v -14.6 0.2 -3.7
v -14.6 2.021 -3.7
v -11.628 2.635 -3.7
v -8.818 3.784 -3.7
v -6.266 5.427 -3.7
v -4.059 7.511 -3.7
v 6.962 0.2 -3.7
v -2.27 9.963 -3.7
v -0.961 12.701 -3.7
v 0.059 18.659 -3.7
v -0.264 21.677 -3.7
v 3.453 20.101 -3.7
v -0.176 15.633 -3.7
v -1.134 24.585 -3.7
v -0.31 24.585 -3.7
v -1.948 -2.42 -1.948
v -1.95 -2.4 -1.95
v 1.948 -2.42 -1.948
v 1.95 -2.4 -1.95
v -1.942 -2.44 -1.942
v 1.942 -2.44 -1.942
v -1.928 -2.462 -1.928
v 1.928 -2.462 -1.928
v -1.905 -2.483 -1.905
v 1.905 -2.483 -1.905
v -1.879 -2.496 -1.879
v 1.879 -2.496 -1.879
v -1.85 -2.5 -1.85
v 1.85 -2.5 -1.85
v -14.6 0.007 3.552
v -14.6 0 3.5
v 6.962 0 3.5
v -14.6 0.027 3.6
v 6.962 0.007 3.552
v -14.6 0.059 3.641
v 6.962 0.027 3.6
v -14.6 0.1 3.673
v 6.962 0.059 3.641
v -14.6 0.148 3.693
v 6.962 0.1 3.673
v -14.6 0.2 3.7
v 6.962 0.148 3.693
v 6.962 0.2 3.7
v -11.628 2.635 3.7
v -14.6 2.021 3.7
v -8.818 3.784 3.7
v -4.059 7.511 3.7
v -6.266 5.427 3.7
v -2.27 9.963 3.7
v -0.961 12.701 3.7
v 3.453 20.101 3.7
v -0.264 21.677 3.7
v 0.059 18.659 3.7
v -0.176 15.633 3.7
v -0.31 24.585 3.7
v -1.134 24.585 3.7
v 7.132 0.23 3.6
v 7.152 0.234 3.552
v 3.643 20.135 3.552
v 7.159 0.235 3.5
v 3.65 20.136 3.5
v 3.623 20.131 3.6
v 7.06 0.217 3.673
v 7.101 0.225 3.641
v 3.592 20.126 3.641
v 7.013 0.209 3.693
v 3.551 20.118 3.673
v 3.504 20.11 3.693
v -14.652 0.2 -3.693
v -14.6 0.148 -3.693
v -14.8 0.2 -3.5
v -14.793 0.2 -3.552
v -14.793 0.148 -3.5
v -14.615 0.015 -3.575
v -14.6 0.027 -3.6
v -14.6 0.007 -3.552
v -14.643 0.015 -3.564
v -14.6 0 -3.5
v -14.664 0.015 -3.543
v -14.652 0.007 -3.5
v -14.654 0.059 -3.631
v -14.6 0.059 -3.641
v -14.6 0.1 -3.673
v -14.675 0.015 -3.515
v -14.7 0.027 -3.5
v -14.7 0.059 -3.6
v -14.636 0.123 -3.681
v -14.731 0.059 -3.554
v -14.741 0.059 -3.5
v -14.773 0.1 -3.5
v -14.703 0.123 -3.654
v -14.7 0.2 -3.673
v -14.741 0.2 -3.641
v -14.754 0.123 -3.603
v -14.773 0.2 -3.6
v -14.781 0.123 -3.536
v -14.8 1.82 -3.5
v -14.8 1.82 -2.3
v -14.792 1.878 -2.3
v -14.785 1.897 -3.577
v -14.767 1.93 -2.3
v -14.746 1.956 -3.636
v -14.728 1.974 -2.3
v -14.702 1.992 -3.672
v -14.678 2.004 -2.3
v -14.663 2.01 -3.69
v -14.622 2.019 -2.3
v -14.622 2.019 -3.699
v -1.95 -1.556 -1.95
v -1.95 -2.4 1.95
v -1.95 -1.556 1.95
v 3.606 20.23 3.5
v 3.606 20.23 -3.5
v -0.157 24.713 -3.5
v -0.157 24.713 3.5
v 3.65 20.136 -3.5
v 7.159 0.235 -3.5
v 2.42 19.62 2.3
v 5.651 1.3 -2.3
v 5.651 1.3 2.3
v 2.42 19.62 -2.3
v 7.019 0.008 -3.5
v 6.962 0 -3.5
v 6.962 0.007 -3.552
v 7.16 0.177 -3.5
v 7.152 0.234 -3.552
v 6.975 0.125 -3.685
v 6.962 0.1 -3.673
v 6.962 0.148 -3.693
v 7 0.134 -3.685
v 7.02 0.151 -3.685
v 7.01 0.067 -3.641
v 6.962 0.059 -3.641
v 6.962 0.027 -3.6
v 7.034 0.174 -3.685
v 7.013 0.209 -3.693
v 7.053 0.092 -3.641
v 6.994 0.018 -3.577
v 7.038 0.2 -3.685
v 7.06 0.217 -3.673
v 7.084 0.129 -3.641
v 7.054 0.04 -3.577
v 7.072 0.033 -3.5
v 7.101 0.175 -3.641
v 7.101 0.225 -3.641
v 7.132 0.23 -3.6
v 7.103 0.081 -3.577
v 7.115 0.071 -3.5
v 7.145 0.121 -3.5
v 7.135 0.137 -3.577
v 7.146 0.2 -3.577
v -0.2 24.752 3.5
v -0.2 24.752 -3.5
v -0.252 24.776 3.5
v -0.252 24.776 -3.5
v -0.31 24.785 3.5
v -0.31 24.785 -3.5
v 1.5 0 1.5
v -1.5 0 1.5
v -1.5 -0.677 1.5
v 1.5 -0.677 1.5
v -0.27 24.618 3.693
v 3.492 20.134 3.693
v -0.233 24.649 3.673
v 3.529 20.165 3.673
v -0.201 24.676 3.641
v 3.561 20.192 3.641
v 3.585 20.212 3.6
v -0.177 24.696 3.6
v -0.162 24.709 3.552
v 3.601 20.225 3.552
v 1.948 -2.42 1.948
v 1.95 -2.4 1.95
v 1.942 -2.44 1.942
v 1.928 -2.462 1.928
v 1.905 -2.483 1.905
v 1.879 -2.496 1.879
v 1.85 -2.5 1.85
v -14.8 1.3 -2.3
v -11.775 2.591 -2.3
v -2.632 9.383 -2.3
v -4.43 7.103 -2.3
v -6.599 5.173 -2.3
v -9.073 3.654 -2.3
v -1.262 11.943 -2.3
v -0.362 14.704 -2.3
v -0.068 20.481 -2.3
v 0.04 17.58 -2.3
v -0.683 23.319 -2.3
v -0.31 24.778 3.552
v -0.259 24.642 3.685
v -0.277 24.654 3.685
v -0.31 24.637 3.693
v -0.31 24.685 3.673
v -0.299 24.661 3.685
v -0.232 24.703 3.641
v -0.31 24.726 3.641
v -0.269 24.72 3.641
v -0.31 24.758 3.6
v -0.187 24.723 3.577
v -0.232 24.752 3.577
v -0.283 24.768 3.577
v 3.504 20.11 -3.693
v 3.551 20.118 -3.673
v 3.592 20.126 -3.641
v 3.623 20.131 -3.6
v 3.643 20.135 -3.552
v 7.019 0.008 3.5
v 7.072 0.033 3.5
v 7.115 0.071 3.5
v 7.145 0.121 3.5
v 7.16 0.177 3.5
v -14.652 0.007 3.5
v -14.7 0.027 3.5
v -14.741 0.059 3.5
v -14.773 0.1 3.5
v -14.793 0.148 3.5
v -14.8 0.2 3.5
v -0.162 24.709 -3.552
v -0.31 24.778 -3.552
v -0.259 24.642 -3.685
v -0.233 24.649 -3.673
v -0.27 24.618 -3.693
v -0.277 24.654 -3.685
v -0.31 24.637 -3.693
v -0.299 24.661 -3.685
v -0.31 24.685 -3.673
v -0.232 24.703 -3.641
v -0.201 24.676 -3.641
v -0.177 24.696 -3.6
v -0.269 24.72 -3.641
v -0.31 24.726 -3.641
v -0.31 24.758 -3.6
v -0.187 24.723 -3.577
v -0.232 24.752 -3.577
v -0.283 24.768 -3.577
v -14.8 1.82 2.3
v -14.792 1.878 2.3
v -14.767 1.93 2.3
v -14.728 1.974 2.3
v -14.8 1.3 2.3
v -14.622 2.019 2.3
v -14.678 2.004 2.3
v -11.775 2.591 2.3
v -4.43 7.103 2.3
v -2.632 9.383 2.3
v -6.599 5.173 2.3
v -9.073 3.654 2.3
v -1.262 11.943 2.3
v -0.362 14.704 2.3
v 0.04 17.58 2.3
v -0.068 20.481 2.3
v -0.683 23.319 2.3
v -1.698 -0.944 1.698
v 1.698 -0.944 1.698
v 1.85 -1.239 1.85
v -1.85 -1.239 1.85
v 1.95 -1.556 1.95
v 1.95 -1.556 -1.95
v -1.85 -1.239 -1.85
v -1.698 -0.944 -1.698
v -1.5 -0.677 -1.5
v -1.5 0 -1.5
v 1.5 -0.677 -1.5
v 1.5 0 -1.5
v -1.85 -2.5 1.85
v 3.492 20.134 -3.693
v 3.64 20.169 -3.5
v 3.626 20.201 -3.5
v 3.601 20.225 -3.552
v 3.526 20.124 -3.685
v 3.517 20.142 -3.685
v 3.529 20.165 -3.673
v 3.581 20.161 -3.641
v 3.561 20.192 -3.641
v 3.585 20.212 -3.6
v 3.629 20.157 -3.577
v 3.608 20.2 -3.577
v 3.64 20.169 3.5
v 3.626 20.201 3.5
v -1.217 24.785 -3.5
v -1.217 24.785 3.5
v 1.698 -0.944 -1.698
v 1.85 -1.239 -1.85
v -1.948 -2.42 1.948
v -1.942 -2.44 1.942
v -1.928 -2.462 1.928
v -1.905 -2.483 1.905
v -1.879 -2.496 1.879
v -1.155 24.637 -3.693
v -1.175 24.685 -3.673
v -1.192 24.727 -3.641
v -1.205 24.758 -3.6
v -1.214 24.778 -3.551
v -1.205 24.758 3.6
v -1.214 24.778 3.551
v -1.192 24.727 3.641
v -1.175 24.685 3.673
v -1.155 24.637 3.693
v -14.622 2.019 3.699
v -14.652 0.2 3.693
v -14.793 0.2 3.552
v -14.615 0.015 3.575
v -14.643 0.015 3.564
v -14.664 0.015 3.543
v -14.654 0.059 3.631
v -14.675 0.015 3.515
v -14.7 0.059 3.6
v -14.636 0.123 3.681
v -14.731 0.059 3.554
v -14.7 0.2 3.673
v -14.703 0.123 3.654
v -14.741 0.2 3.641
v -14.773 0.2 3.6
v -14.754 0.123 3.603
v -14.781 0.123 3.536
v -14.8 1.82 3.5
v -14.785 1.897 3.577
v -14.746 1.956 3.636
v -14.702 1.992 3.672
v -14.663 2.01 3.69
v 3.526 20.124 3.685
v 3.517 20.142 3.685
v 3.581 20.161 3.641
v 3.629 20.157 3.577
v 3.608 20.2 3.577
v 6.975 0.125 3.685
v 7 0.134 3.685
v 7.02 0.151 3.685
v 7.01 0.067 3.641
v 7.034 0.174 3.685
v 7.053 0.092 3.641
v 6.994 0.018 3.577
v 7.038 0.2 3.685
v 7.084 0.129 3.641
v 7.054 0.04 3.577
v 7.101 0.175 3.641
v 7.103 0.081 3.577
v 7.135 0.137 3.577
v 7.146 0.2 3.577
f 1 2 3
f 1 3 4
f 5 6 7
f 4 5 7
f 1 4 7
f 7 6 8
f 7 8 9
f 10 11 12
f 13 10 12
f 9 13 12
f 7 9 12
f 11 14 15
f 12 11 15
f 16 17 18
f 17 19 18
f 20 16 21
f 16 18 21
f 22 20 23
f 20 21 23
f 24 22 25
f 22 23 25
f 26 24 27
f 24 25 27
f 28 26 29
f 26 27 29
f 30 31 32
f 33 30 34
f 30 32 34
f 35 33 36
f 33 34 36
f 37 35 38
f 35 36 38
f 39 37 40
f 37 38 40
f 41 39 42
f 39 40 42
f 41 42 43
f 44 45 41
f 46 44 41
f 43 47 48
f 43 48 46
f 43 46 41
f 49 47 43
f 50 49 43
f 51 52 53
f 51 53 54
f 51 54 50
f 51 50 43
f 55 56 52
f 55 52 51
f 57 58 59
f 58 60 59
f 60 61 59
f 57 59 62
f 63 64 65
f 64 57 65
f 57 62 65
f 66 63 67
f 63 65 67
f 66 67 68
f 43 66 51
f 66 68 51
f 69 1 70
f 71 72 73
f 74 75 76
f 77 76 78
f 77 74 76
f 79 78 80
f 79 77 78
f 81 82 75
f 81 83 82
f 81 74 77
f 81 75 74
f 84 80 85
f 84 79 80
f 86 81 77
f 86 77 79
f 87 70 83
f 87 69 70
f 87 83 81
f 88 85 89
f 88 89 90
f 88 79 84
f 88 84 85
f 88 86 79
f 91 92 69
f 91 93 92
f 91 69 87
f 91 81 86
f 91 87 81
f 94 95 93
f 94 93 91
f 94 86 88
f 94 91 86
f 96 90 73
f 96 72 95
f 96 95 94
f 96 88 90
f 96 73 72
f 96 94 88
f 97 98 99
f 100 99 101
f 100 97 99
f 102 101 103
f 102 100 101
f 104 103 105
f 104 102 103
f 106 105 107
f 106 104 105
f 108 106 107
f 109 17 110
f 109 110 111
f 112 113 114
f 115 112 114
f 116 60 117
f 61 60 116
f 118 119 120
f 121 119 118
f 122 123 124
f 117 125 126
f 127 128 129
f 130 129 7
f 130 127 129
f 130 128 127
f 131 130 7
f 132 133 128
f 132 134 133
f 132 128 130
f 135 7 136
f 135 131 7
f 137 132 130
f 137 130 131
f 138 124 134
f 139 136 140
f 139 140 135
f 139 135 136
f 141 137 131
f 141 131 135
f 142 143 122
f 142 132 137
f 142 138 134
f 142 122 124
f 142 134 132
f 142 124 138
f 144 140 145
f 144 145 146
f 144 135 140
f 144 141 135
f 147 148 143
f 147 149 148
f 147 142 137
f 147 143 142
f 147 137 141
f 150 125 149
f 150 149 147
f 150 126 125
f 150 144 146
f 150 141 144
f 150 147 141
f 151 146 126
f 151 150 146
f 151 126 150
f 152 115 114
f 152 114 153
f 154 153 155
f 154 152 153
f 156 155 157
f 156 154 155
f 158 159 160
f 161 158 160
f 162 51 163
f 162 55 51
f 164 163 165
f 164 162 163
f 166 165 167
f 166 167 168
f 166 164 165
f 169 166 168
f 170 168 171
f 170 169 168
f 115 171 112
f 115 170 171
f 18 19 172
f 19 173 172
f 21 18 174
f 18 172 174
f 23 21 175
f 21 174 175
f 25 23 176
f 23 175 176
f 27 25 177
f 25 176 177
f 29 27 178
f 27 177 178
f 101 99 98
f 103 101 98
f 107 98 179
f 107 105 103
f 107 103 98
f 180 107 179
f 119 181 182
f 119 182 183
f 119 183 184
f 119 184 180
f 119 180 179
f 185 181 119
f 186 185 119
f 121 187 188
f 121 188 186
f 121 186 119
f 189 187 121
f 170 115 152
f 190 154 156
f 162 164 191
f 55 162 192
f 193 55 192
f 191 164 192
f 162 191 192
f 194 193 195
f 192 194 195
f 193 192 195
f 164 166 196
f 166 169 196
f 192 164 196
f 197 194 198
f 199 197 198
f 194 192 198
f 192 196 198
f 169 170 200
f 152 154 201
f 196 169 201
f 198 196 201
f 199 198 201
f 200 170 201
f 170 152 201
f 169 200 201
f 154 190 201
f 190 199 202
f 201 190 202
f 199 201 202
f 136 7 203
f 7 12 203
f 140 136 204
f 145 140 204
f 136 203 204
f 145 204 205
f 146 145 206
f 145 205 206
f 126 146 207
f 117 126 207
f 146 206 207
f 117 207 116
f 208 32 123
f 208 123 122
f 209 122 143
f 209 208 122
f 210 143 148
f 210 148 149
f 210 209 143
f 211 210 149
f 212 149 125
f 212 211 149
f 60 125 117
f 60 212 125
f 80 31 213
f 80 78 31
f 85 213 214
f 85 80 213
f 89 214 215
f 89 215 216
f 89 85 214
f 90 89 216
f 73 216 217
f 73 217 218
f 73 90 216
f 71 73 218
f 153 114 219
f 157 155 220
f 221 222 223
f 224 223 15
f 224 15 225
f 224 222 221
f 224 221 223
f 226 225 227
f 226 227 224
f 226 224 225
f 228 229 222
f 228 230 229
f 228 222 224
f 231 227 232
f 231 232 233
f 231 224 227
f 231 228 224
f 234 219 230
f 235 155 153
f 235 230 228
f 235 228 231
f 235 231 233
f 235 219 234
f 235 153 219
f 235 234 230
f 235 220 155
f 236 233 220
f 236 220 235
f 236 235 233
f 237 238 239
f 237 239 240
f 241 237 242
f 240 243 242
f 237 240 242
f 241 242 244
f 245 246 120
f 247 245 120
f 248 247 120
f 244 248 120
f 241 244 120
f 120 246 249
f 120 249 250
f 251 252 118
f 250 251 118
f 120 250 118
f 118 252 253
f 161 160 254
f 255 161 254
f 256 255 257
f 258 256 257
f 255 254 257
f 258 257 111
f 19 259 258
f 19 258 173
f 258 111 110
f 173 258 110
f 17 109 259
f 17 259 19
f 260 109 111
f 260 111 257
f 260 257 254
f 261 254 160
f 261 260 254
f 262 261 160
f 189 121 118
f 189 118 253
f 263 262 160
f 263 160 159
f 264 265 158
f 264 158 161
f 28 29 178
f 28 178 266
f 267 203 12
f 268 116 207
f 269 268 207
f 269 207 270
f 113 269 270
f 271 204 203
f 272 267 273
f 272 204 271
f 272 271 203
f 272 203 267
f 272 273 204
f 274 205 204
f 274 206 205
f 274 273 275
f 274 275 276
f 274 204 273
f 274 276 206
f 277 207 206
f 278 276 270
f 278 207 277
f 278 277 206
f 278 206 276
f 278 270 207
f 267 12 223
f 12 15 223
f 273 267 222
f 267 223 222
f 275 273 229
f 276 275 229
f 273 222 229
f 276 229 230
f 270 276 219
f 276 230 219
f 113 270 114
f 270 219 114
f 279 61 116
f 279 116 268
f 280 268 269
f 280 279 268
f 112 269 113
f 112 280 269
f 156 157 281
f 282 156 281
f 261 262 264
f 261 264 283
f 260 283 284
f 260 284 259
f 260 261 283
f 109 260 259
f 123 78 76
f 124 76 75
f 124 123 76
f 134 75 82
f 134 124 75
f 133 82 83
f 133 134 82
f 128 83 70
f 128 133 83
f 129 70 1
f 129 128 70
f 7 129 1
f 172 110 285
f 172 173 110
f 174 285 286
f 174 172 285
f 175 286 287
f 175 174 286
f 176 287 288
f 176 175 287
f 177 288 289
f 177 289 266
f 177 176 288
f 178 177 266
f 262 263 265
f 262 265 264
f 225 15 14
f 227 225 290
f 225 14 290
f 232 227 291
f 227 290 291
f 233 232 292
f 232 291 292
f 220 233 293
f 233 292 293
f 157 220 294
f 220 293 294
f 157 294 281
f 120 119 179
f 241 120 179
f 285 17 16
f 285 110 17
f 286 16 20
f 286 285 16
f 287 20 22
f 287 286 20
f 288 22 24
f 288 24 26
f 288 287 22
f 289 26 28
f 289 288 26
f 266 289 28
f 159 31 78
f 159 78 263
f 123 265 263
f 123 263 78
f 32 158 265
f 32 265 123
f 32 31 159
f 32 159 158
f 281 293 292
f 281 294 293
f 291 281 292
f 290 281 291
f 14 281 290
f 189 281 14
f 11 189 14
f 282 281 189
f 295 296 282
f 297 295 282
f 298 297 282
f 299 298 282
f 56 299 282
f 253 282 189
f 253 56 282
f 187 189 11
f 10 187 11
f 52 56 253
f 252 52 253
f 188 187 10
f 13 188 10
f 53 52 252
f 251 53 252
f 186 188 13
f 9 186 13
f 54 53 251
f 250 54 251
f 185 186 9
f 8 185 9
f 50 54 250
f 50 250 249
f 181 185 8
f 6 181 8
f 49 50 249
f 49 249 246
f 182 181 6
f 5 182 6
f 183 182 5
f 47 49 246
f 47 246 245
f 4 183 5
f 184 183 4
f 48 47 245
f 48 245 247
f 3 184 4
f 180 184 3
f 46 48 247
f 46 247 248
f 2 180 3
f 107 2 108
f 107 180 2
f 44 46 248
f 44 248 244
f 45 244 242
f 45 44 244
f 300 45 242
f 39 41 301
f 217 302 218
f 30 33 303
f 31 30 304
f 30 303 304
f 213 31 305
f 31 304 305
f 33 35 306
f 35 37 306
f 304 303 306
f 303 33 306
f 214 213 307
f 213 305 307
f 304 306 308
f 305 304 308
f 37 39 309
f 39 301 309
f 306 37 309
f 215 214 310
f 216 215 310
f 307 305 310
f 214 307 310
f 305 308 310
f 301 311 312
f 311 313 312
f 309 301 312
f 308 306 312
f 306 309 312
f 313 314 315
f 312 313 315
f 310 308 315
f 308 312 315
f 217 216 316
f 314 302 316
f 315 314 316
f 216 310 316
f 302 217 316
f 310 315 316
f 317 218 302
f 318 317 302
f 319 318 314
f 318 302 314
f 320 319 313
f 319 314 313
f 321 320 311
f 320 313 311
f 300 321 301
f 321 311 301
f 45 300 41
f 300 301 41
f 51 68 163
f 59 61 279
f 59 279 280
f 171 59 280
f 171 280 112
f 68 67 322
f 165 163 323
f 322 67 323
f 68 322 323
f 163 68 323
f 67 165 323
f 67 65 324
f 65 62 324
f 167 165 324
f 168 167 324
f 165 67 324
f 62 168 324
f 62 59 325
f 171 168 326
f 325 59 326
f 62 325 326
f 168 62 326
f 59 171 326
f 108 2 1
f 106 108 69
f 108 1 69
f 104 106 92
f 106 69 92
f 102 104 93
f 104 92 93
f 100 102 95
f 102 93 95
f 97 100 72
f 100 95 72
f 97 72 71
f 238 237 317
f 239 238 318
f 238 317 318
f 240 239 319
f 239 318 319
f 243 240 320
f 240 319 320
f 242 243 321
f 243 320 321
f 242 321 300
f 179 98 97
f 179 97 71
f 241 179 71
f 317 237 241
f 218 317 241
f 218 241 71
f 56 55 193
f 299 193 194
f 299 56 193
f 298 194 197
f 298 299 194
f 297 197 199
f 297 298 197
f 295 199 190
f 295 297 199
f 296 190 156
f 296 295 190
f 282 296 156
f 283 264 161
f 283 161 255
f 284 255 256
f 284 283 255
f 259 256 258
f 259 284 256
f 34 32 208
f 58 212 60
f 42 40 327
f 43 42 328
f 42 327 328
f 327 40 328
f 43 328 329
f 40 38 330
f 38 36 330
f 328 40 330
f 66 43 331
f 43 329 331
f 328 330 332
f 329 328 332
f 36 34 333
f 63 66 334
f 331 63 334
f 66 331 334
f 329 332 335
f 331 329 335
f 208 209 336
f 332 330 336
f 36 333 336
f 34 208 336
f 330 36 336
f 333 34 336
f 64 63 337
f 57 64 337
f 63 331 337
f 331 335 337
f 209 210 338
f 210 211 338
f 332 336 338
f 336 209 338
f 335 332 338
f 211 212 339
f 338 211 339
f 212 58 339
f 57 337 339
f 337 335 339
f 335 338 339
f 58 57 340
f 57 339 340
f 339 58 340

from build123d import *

# Parameters (mm, degrees)
EXTRUDE_1_DEPTH          = 2.3
EXTRUDE_1_DEPTH_BACK     = 2.3
EXTRUDE_2_DEPTH          = 1.4
EXTRUDE_3_DEPTH          = 2
EXTRUDE_3_DEPTH_BACK     = 2
CUT_EXTRUDE_2_DEPTH      = 7.4
CUT_EXTRUDE_3_DEPTH      = 2
CUT_EXTRUDE_3_DEPTH_BACK = 2
FILLET_1_R               = 0.2
FILLET_2_R               = 0.1


with BuildPart() as part:
    # 草图1 → 凸台-拉伸1 (new, two sides: drawn at the far end of the back side and taken through both)
    with BuildSketch(Plane.XY.offset(-EXTRUDE_1_DEPTH_BACK)):
        Polygon((0, 0), (-14.8, 0), (-14.8, 1.3), (0, 1.3), (5.65072033, 1.3), (2.420449835, 19.619774331), (-0.822713256, 23.484825595), (-1.2165133, 23.484825595), (-1.2165133, 24.784825595), (-0.2165133, 24.784825595), (3.640212358, 20.188558937), (7.2, 0), align=None)
    extrude(amount=EXTRUDE_1_DEPTH + EXTRUDE_1_DEPTH_BACK)

    # 草图2 → 凸台-拉伸2 (add)
    with BuildSketch(Plane.XY.offset(2.3)):
        with BuildLine():
            Line((-14.8, 0), (7.2, 0))
            Line((7.2, 0), (3.640212358, 20.188558937))
            Line((3.640212358, 20.188558937), (-0.2165133, 24.784825595))
            Line((-0.2165133, 24.784825595), (-1.2165133, 24.784825595))
            ThreePointArc((-1.2165133, 24.784825595), (-2.266370135, 9.969308294), (-14.8, 2))
            Line((-14.8, 2), (-14.8, 0))
        make_face()
    extrude_2 = extrude(amount=EXTRUDE_2_DEPTH)

    # 镜向1: 凸台-拉伸2 across plane
    add(extrude_2.mirror(Plane.XY))

    # 草图4 → 凸台-拉伸3 (add, two sides: drawn at the far end of the back side and taken through both)
    with BuildSketch(Plane.XY.offset(-EXTRUDE_3_DEPTH_BACK)):
        with BuildLine():
            Line((-1.5, 0), (1.5, 0))
            Line((1.5, 0), (1.5, -0.677124344))
            ThreePointArc((1.5, -0.677124344), (1.780042303, -1.088161527), (1.95, -1.555590279))
            Line((1.95, -1.555590279), (1.95, -2.5))
            Line((1.95, -2.5), (-1.95, -2.5))
            Line((-1.95, -2.5), (-1.95, -1.555590279))
            ThreePointArc((-1.95, -1.555590279), (-1.780042303, -1.088161527), (-1.5, -0.677124344))
            Line((-1.5, -0.677124344), (-1.5, 0))
        make_face()
    extrude(amount=EXTRUDE_3_DEPTH + EXTRUDE_3_DEPTH_BACK)

    # 草图5 → 切除-拉伸2 (cut)
    with BuildSketch(Plane.XY.offset(3.7)):
        with BuildLine():
            Line((-1.2165133, 24.784825595), (-14.8, 2))
            ThreePointArc((-14.8, 2), (-2.266370135, 9.969308294), (-1.2165133, 24.784825595))
        make_face()
    extrude(amount=-CUT_EXTRUDE_2_DEPTH, mode=Mode.SUBTRACT)

    # 草图6 → 切除-拉伸3 (cut, two sides: drawn at the far end of the back side and taken through both)
    with BuildSketch(Plane(origin=(0, 0, 0), x_dir=(0, 0, -1), z_dir=(1, 0, 0)).offset(-CUT_EXTRUDE_3_DEPTH_BACK)):
        with BuildLine():
            Line((1.5, 0), (1.5, -0.677124344))
            ThreePointArc((1.5, -0.677124344), (1.780042303, -1.088161527), (1.95, -1.555590279))
            Line((1.95, -1.555590279), (1.95, -2.5))
            Line((1.95, -2.5), (2, -2.5))
            Line((2, -2.5), (2, 0))
            Line((2, 0), (1.5, 0))
        make_face()
        with BuildLine():
            Line((-1.95, -2.5), (-2, -2.5))
            Line((-2, -2.5), (-2, 0))
            Line((-2, 0), (-1.5, 0))
            Line((-1.5, 0), (-1.5, -0.677124344))
            ThreePointArc((-1.5, -0.677124344), (-1.780042303, -1.088161527), (-1.95, -1.555590279))
            Line((-1.95, -1.555590279), (-1.95, -2.5))
        make_face()
    extrude(amount=CUT_EXTRUDE_3_DEPTH + CUT_EXTRUDE_3_DEPTH_BACK, mode=Mode.SUBTRACT)

    # 圆角1
    fillet_1_edges = [part.edges().sort_by_distance(p)[0] for p in [
        (-14.8, 2, -3),
        (-14.8, 2, 3),
        (-14.8, 1, 3.7),
        (-14.8, 1, -3.7),
        (-0.7165133, 24.784825595, -3.7),
        (-0.7165133, 24.784825595, 3.7),
        (-0.2165133, 24.784825595, 0),
        (1.711849529, 22.486692266, -3.7),
        (1.711849529, 22.486692266, 3.7),
        (3.640212358, 20.188558937, 0),
        (5.420106179, 10.094279468, -3.7),
        (5.420106179, 10.094279468, 3.7),
        (7.2, 0, 0),
        (-3.8, 0, -3.7),
        (-3.8, 0, 3.7),
        (-14.8, 0, 0),
    ]]
    fillet(fillet_1_edges, radius=FILLET_1_R)

    # 圆角2
    fillet_2_edges = [part.edges().sort_by_distance(p)[0] for p in [
        (1.95, -2.5, 0),
        (-1.95, -2.5, 0),
        (0, -2.5, -1.95),
        (0, -2.5, 1.95),
    ]]
    fillet(fillet_2_edges, radius=FILLET_2_R)


solid = part.part
